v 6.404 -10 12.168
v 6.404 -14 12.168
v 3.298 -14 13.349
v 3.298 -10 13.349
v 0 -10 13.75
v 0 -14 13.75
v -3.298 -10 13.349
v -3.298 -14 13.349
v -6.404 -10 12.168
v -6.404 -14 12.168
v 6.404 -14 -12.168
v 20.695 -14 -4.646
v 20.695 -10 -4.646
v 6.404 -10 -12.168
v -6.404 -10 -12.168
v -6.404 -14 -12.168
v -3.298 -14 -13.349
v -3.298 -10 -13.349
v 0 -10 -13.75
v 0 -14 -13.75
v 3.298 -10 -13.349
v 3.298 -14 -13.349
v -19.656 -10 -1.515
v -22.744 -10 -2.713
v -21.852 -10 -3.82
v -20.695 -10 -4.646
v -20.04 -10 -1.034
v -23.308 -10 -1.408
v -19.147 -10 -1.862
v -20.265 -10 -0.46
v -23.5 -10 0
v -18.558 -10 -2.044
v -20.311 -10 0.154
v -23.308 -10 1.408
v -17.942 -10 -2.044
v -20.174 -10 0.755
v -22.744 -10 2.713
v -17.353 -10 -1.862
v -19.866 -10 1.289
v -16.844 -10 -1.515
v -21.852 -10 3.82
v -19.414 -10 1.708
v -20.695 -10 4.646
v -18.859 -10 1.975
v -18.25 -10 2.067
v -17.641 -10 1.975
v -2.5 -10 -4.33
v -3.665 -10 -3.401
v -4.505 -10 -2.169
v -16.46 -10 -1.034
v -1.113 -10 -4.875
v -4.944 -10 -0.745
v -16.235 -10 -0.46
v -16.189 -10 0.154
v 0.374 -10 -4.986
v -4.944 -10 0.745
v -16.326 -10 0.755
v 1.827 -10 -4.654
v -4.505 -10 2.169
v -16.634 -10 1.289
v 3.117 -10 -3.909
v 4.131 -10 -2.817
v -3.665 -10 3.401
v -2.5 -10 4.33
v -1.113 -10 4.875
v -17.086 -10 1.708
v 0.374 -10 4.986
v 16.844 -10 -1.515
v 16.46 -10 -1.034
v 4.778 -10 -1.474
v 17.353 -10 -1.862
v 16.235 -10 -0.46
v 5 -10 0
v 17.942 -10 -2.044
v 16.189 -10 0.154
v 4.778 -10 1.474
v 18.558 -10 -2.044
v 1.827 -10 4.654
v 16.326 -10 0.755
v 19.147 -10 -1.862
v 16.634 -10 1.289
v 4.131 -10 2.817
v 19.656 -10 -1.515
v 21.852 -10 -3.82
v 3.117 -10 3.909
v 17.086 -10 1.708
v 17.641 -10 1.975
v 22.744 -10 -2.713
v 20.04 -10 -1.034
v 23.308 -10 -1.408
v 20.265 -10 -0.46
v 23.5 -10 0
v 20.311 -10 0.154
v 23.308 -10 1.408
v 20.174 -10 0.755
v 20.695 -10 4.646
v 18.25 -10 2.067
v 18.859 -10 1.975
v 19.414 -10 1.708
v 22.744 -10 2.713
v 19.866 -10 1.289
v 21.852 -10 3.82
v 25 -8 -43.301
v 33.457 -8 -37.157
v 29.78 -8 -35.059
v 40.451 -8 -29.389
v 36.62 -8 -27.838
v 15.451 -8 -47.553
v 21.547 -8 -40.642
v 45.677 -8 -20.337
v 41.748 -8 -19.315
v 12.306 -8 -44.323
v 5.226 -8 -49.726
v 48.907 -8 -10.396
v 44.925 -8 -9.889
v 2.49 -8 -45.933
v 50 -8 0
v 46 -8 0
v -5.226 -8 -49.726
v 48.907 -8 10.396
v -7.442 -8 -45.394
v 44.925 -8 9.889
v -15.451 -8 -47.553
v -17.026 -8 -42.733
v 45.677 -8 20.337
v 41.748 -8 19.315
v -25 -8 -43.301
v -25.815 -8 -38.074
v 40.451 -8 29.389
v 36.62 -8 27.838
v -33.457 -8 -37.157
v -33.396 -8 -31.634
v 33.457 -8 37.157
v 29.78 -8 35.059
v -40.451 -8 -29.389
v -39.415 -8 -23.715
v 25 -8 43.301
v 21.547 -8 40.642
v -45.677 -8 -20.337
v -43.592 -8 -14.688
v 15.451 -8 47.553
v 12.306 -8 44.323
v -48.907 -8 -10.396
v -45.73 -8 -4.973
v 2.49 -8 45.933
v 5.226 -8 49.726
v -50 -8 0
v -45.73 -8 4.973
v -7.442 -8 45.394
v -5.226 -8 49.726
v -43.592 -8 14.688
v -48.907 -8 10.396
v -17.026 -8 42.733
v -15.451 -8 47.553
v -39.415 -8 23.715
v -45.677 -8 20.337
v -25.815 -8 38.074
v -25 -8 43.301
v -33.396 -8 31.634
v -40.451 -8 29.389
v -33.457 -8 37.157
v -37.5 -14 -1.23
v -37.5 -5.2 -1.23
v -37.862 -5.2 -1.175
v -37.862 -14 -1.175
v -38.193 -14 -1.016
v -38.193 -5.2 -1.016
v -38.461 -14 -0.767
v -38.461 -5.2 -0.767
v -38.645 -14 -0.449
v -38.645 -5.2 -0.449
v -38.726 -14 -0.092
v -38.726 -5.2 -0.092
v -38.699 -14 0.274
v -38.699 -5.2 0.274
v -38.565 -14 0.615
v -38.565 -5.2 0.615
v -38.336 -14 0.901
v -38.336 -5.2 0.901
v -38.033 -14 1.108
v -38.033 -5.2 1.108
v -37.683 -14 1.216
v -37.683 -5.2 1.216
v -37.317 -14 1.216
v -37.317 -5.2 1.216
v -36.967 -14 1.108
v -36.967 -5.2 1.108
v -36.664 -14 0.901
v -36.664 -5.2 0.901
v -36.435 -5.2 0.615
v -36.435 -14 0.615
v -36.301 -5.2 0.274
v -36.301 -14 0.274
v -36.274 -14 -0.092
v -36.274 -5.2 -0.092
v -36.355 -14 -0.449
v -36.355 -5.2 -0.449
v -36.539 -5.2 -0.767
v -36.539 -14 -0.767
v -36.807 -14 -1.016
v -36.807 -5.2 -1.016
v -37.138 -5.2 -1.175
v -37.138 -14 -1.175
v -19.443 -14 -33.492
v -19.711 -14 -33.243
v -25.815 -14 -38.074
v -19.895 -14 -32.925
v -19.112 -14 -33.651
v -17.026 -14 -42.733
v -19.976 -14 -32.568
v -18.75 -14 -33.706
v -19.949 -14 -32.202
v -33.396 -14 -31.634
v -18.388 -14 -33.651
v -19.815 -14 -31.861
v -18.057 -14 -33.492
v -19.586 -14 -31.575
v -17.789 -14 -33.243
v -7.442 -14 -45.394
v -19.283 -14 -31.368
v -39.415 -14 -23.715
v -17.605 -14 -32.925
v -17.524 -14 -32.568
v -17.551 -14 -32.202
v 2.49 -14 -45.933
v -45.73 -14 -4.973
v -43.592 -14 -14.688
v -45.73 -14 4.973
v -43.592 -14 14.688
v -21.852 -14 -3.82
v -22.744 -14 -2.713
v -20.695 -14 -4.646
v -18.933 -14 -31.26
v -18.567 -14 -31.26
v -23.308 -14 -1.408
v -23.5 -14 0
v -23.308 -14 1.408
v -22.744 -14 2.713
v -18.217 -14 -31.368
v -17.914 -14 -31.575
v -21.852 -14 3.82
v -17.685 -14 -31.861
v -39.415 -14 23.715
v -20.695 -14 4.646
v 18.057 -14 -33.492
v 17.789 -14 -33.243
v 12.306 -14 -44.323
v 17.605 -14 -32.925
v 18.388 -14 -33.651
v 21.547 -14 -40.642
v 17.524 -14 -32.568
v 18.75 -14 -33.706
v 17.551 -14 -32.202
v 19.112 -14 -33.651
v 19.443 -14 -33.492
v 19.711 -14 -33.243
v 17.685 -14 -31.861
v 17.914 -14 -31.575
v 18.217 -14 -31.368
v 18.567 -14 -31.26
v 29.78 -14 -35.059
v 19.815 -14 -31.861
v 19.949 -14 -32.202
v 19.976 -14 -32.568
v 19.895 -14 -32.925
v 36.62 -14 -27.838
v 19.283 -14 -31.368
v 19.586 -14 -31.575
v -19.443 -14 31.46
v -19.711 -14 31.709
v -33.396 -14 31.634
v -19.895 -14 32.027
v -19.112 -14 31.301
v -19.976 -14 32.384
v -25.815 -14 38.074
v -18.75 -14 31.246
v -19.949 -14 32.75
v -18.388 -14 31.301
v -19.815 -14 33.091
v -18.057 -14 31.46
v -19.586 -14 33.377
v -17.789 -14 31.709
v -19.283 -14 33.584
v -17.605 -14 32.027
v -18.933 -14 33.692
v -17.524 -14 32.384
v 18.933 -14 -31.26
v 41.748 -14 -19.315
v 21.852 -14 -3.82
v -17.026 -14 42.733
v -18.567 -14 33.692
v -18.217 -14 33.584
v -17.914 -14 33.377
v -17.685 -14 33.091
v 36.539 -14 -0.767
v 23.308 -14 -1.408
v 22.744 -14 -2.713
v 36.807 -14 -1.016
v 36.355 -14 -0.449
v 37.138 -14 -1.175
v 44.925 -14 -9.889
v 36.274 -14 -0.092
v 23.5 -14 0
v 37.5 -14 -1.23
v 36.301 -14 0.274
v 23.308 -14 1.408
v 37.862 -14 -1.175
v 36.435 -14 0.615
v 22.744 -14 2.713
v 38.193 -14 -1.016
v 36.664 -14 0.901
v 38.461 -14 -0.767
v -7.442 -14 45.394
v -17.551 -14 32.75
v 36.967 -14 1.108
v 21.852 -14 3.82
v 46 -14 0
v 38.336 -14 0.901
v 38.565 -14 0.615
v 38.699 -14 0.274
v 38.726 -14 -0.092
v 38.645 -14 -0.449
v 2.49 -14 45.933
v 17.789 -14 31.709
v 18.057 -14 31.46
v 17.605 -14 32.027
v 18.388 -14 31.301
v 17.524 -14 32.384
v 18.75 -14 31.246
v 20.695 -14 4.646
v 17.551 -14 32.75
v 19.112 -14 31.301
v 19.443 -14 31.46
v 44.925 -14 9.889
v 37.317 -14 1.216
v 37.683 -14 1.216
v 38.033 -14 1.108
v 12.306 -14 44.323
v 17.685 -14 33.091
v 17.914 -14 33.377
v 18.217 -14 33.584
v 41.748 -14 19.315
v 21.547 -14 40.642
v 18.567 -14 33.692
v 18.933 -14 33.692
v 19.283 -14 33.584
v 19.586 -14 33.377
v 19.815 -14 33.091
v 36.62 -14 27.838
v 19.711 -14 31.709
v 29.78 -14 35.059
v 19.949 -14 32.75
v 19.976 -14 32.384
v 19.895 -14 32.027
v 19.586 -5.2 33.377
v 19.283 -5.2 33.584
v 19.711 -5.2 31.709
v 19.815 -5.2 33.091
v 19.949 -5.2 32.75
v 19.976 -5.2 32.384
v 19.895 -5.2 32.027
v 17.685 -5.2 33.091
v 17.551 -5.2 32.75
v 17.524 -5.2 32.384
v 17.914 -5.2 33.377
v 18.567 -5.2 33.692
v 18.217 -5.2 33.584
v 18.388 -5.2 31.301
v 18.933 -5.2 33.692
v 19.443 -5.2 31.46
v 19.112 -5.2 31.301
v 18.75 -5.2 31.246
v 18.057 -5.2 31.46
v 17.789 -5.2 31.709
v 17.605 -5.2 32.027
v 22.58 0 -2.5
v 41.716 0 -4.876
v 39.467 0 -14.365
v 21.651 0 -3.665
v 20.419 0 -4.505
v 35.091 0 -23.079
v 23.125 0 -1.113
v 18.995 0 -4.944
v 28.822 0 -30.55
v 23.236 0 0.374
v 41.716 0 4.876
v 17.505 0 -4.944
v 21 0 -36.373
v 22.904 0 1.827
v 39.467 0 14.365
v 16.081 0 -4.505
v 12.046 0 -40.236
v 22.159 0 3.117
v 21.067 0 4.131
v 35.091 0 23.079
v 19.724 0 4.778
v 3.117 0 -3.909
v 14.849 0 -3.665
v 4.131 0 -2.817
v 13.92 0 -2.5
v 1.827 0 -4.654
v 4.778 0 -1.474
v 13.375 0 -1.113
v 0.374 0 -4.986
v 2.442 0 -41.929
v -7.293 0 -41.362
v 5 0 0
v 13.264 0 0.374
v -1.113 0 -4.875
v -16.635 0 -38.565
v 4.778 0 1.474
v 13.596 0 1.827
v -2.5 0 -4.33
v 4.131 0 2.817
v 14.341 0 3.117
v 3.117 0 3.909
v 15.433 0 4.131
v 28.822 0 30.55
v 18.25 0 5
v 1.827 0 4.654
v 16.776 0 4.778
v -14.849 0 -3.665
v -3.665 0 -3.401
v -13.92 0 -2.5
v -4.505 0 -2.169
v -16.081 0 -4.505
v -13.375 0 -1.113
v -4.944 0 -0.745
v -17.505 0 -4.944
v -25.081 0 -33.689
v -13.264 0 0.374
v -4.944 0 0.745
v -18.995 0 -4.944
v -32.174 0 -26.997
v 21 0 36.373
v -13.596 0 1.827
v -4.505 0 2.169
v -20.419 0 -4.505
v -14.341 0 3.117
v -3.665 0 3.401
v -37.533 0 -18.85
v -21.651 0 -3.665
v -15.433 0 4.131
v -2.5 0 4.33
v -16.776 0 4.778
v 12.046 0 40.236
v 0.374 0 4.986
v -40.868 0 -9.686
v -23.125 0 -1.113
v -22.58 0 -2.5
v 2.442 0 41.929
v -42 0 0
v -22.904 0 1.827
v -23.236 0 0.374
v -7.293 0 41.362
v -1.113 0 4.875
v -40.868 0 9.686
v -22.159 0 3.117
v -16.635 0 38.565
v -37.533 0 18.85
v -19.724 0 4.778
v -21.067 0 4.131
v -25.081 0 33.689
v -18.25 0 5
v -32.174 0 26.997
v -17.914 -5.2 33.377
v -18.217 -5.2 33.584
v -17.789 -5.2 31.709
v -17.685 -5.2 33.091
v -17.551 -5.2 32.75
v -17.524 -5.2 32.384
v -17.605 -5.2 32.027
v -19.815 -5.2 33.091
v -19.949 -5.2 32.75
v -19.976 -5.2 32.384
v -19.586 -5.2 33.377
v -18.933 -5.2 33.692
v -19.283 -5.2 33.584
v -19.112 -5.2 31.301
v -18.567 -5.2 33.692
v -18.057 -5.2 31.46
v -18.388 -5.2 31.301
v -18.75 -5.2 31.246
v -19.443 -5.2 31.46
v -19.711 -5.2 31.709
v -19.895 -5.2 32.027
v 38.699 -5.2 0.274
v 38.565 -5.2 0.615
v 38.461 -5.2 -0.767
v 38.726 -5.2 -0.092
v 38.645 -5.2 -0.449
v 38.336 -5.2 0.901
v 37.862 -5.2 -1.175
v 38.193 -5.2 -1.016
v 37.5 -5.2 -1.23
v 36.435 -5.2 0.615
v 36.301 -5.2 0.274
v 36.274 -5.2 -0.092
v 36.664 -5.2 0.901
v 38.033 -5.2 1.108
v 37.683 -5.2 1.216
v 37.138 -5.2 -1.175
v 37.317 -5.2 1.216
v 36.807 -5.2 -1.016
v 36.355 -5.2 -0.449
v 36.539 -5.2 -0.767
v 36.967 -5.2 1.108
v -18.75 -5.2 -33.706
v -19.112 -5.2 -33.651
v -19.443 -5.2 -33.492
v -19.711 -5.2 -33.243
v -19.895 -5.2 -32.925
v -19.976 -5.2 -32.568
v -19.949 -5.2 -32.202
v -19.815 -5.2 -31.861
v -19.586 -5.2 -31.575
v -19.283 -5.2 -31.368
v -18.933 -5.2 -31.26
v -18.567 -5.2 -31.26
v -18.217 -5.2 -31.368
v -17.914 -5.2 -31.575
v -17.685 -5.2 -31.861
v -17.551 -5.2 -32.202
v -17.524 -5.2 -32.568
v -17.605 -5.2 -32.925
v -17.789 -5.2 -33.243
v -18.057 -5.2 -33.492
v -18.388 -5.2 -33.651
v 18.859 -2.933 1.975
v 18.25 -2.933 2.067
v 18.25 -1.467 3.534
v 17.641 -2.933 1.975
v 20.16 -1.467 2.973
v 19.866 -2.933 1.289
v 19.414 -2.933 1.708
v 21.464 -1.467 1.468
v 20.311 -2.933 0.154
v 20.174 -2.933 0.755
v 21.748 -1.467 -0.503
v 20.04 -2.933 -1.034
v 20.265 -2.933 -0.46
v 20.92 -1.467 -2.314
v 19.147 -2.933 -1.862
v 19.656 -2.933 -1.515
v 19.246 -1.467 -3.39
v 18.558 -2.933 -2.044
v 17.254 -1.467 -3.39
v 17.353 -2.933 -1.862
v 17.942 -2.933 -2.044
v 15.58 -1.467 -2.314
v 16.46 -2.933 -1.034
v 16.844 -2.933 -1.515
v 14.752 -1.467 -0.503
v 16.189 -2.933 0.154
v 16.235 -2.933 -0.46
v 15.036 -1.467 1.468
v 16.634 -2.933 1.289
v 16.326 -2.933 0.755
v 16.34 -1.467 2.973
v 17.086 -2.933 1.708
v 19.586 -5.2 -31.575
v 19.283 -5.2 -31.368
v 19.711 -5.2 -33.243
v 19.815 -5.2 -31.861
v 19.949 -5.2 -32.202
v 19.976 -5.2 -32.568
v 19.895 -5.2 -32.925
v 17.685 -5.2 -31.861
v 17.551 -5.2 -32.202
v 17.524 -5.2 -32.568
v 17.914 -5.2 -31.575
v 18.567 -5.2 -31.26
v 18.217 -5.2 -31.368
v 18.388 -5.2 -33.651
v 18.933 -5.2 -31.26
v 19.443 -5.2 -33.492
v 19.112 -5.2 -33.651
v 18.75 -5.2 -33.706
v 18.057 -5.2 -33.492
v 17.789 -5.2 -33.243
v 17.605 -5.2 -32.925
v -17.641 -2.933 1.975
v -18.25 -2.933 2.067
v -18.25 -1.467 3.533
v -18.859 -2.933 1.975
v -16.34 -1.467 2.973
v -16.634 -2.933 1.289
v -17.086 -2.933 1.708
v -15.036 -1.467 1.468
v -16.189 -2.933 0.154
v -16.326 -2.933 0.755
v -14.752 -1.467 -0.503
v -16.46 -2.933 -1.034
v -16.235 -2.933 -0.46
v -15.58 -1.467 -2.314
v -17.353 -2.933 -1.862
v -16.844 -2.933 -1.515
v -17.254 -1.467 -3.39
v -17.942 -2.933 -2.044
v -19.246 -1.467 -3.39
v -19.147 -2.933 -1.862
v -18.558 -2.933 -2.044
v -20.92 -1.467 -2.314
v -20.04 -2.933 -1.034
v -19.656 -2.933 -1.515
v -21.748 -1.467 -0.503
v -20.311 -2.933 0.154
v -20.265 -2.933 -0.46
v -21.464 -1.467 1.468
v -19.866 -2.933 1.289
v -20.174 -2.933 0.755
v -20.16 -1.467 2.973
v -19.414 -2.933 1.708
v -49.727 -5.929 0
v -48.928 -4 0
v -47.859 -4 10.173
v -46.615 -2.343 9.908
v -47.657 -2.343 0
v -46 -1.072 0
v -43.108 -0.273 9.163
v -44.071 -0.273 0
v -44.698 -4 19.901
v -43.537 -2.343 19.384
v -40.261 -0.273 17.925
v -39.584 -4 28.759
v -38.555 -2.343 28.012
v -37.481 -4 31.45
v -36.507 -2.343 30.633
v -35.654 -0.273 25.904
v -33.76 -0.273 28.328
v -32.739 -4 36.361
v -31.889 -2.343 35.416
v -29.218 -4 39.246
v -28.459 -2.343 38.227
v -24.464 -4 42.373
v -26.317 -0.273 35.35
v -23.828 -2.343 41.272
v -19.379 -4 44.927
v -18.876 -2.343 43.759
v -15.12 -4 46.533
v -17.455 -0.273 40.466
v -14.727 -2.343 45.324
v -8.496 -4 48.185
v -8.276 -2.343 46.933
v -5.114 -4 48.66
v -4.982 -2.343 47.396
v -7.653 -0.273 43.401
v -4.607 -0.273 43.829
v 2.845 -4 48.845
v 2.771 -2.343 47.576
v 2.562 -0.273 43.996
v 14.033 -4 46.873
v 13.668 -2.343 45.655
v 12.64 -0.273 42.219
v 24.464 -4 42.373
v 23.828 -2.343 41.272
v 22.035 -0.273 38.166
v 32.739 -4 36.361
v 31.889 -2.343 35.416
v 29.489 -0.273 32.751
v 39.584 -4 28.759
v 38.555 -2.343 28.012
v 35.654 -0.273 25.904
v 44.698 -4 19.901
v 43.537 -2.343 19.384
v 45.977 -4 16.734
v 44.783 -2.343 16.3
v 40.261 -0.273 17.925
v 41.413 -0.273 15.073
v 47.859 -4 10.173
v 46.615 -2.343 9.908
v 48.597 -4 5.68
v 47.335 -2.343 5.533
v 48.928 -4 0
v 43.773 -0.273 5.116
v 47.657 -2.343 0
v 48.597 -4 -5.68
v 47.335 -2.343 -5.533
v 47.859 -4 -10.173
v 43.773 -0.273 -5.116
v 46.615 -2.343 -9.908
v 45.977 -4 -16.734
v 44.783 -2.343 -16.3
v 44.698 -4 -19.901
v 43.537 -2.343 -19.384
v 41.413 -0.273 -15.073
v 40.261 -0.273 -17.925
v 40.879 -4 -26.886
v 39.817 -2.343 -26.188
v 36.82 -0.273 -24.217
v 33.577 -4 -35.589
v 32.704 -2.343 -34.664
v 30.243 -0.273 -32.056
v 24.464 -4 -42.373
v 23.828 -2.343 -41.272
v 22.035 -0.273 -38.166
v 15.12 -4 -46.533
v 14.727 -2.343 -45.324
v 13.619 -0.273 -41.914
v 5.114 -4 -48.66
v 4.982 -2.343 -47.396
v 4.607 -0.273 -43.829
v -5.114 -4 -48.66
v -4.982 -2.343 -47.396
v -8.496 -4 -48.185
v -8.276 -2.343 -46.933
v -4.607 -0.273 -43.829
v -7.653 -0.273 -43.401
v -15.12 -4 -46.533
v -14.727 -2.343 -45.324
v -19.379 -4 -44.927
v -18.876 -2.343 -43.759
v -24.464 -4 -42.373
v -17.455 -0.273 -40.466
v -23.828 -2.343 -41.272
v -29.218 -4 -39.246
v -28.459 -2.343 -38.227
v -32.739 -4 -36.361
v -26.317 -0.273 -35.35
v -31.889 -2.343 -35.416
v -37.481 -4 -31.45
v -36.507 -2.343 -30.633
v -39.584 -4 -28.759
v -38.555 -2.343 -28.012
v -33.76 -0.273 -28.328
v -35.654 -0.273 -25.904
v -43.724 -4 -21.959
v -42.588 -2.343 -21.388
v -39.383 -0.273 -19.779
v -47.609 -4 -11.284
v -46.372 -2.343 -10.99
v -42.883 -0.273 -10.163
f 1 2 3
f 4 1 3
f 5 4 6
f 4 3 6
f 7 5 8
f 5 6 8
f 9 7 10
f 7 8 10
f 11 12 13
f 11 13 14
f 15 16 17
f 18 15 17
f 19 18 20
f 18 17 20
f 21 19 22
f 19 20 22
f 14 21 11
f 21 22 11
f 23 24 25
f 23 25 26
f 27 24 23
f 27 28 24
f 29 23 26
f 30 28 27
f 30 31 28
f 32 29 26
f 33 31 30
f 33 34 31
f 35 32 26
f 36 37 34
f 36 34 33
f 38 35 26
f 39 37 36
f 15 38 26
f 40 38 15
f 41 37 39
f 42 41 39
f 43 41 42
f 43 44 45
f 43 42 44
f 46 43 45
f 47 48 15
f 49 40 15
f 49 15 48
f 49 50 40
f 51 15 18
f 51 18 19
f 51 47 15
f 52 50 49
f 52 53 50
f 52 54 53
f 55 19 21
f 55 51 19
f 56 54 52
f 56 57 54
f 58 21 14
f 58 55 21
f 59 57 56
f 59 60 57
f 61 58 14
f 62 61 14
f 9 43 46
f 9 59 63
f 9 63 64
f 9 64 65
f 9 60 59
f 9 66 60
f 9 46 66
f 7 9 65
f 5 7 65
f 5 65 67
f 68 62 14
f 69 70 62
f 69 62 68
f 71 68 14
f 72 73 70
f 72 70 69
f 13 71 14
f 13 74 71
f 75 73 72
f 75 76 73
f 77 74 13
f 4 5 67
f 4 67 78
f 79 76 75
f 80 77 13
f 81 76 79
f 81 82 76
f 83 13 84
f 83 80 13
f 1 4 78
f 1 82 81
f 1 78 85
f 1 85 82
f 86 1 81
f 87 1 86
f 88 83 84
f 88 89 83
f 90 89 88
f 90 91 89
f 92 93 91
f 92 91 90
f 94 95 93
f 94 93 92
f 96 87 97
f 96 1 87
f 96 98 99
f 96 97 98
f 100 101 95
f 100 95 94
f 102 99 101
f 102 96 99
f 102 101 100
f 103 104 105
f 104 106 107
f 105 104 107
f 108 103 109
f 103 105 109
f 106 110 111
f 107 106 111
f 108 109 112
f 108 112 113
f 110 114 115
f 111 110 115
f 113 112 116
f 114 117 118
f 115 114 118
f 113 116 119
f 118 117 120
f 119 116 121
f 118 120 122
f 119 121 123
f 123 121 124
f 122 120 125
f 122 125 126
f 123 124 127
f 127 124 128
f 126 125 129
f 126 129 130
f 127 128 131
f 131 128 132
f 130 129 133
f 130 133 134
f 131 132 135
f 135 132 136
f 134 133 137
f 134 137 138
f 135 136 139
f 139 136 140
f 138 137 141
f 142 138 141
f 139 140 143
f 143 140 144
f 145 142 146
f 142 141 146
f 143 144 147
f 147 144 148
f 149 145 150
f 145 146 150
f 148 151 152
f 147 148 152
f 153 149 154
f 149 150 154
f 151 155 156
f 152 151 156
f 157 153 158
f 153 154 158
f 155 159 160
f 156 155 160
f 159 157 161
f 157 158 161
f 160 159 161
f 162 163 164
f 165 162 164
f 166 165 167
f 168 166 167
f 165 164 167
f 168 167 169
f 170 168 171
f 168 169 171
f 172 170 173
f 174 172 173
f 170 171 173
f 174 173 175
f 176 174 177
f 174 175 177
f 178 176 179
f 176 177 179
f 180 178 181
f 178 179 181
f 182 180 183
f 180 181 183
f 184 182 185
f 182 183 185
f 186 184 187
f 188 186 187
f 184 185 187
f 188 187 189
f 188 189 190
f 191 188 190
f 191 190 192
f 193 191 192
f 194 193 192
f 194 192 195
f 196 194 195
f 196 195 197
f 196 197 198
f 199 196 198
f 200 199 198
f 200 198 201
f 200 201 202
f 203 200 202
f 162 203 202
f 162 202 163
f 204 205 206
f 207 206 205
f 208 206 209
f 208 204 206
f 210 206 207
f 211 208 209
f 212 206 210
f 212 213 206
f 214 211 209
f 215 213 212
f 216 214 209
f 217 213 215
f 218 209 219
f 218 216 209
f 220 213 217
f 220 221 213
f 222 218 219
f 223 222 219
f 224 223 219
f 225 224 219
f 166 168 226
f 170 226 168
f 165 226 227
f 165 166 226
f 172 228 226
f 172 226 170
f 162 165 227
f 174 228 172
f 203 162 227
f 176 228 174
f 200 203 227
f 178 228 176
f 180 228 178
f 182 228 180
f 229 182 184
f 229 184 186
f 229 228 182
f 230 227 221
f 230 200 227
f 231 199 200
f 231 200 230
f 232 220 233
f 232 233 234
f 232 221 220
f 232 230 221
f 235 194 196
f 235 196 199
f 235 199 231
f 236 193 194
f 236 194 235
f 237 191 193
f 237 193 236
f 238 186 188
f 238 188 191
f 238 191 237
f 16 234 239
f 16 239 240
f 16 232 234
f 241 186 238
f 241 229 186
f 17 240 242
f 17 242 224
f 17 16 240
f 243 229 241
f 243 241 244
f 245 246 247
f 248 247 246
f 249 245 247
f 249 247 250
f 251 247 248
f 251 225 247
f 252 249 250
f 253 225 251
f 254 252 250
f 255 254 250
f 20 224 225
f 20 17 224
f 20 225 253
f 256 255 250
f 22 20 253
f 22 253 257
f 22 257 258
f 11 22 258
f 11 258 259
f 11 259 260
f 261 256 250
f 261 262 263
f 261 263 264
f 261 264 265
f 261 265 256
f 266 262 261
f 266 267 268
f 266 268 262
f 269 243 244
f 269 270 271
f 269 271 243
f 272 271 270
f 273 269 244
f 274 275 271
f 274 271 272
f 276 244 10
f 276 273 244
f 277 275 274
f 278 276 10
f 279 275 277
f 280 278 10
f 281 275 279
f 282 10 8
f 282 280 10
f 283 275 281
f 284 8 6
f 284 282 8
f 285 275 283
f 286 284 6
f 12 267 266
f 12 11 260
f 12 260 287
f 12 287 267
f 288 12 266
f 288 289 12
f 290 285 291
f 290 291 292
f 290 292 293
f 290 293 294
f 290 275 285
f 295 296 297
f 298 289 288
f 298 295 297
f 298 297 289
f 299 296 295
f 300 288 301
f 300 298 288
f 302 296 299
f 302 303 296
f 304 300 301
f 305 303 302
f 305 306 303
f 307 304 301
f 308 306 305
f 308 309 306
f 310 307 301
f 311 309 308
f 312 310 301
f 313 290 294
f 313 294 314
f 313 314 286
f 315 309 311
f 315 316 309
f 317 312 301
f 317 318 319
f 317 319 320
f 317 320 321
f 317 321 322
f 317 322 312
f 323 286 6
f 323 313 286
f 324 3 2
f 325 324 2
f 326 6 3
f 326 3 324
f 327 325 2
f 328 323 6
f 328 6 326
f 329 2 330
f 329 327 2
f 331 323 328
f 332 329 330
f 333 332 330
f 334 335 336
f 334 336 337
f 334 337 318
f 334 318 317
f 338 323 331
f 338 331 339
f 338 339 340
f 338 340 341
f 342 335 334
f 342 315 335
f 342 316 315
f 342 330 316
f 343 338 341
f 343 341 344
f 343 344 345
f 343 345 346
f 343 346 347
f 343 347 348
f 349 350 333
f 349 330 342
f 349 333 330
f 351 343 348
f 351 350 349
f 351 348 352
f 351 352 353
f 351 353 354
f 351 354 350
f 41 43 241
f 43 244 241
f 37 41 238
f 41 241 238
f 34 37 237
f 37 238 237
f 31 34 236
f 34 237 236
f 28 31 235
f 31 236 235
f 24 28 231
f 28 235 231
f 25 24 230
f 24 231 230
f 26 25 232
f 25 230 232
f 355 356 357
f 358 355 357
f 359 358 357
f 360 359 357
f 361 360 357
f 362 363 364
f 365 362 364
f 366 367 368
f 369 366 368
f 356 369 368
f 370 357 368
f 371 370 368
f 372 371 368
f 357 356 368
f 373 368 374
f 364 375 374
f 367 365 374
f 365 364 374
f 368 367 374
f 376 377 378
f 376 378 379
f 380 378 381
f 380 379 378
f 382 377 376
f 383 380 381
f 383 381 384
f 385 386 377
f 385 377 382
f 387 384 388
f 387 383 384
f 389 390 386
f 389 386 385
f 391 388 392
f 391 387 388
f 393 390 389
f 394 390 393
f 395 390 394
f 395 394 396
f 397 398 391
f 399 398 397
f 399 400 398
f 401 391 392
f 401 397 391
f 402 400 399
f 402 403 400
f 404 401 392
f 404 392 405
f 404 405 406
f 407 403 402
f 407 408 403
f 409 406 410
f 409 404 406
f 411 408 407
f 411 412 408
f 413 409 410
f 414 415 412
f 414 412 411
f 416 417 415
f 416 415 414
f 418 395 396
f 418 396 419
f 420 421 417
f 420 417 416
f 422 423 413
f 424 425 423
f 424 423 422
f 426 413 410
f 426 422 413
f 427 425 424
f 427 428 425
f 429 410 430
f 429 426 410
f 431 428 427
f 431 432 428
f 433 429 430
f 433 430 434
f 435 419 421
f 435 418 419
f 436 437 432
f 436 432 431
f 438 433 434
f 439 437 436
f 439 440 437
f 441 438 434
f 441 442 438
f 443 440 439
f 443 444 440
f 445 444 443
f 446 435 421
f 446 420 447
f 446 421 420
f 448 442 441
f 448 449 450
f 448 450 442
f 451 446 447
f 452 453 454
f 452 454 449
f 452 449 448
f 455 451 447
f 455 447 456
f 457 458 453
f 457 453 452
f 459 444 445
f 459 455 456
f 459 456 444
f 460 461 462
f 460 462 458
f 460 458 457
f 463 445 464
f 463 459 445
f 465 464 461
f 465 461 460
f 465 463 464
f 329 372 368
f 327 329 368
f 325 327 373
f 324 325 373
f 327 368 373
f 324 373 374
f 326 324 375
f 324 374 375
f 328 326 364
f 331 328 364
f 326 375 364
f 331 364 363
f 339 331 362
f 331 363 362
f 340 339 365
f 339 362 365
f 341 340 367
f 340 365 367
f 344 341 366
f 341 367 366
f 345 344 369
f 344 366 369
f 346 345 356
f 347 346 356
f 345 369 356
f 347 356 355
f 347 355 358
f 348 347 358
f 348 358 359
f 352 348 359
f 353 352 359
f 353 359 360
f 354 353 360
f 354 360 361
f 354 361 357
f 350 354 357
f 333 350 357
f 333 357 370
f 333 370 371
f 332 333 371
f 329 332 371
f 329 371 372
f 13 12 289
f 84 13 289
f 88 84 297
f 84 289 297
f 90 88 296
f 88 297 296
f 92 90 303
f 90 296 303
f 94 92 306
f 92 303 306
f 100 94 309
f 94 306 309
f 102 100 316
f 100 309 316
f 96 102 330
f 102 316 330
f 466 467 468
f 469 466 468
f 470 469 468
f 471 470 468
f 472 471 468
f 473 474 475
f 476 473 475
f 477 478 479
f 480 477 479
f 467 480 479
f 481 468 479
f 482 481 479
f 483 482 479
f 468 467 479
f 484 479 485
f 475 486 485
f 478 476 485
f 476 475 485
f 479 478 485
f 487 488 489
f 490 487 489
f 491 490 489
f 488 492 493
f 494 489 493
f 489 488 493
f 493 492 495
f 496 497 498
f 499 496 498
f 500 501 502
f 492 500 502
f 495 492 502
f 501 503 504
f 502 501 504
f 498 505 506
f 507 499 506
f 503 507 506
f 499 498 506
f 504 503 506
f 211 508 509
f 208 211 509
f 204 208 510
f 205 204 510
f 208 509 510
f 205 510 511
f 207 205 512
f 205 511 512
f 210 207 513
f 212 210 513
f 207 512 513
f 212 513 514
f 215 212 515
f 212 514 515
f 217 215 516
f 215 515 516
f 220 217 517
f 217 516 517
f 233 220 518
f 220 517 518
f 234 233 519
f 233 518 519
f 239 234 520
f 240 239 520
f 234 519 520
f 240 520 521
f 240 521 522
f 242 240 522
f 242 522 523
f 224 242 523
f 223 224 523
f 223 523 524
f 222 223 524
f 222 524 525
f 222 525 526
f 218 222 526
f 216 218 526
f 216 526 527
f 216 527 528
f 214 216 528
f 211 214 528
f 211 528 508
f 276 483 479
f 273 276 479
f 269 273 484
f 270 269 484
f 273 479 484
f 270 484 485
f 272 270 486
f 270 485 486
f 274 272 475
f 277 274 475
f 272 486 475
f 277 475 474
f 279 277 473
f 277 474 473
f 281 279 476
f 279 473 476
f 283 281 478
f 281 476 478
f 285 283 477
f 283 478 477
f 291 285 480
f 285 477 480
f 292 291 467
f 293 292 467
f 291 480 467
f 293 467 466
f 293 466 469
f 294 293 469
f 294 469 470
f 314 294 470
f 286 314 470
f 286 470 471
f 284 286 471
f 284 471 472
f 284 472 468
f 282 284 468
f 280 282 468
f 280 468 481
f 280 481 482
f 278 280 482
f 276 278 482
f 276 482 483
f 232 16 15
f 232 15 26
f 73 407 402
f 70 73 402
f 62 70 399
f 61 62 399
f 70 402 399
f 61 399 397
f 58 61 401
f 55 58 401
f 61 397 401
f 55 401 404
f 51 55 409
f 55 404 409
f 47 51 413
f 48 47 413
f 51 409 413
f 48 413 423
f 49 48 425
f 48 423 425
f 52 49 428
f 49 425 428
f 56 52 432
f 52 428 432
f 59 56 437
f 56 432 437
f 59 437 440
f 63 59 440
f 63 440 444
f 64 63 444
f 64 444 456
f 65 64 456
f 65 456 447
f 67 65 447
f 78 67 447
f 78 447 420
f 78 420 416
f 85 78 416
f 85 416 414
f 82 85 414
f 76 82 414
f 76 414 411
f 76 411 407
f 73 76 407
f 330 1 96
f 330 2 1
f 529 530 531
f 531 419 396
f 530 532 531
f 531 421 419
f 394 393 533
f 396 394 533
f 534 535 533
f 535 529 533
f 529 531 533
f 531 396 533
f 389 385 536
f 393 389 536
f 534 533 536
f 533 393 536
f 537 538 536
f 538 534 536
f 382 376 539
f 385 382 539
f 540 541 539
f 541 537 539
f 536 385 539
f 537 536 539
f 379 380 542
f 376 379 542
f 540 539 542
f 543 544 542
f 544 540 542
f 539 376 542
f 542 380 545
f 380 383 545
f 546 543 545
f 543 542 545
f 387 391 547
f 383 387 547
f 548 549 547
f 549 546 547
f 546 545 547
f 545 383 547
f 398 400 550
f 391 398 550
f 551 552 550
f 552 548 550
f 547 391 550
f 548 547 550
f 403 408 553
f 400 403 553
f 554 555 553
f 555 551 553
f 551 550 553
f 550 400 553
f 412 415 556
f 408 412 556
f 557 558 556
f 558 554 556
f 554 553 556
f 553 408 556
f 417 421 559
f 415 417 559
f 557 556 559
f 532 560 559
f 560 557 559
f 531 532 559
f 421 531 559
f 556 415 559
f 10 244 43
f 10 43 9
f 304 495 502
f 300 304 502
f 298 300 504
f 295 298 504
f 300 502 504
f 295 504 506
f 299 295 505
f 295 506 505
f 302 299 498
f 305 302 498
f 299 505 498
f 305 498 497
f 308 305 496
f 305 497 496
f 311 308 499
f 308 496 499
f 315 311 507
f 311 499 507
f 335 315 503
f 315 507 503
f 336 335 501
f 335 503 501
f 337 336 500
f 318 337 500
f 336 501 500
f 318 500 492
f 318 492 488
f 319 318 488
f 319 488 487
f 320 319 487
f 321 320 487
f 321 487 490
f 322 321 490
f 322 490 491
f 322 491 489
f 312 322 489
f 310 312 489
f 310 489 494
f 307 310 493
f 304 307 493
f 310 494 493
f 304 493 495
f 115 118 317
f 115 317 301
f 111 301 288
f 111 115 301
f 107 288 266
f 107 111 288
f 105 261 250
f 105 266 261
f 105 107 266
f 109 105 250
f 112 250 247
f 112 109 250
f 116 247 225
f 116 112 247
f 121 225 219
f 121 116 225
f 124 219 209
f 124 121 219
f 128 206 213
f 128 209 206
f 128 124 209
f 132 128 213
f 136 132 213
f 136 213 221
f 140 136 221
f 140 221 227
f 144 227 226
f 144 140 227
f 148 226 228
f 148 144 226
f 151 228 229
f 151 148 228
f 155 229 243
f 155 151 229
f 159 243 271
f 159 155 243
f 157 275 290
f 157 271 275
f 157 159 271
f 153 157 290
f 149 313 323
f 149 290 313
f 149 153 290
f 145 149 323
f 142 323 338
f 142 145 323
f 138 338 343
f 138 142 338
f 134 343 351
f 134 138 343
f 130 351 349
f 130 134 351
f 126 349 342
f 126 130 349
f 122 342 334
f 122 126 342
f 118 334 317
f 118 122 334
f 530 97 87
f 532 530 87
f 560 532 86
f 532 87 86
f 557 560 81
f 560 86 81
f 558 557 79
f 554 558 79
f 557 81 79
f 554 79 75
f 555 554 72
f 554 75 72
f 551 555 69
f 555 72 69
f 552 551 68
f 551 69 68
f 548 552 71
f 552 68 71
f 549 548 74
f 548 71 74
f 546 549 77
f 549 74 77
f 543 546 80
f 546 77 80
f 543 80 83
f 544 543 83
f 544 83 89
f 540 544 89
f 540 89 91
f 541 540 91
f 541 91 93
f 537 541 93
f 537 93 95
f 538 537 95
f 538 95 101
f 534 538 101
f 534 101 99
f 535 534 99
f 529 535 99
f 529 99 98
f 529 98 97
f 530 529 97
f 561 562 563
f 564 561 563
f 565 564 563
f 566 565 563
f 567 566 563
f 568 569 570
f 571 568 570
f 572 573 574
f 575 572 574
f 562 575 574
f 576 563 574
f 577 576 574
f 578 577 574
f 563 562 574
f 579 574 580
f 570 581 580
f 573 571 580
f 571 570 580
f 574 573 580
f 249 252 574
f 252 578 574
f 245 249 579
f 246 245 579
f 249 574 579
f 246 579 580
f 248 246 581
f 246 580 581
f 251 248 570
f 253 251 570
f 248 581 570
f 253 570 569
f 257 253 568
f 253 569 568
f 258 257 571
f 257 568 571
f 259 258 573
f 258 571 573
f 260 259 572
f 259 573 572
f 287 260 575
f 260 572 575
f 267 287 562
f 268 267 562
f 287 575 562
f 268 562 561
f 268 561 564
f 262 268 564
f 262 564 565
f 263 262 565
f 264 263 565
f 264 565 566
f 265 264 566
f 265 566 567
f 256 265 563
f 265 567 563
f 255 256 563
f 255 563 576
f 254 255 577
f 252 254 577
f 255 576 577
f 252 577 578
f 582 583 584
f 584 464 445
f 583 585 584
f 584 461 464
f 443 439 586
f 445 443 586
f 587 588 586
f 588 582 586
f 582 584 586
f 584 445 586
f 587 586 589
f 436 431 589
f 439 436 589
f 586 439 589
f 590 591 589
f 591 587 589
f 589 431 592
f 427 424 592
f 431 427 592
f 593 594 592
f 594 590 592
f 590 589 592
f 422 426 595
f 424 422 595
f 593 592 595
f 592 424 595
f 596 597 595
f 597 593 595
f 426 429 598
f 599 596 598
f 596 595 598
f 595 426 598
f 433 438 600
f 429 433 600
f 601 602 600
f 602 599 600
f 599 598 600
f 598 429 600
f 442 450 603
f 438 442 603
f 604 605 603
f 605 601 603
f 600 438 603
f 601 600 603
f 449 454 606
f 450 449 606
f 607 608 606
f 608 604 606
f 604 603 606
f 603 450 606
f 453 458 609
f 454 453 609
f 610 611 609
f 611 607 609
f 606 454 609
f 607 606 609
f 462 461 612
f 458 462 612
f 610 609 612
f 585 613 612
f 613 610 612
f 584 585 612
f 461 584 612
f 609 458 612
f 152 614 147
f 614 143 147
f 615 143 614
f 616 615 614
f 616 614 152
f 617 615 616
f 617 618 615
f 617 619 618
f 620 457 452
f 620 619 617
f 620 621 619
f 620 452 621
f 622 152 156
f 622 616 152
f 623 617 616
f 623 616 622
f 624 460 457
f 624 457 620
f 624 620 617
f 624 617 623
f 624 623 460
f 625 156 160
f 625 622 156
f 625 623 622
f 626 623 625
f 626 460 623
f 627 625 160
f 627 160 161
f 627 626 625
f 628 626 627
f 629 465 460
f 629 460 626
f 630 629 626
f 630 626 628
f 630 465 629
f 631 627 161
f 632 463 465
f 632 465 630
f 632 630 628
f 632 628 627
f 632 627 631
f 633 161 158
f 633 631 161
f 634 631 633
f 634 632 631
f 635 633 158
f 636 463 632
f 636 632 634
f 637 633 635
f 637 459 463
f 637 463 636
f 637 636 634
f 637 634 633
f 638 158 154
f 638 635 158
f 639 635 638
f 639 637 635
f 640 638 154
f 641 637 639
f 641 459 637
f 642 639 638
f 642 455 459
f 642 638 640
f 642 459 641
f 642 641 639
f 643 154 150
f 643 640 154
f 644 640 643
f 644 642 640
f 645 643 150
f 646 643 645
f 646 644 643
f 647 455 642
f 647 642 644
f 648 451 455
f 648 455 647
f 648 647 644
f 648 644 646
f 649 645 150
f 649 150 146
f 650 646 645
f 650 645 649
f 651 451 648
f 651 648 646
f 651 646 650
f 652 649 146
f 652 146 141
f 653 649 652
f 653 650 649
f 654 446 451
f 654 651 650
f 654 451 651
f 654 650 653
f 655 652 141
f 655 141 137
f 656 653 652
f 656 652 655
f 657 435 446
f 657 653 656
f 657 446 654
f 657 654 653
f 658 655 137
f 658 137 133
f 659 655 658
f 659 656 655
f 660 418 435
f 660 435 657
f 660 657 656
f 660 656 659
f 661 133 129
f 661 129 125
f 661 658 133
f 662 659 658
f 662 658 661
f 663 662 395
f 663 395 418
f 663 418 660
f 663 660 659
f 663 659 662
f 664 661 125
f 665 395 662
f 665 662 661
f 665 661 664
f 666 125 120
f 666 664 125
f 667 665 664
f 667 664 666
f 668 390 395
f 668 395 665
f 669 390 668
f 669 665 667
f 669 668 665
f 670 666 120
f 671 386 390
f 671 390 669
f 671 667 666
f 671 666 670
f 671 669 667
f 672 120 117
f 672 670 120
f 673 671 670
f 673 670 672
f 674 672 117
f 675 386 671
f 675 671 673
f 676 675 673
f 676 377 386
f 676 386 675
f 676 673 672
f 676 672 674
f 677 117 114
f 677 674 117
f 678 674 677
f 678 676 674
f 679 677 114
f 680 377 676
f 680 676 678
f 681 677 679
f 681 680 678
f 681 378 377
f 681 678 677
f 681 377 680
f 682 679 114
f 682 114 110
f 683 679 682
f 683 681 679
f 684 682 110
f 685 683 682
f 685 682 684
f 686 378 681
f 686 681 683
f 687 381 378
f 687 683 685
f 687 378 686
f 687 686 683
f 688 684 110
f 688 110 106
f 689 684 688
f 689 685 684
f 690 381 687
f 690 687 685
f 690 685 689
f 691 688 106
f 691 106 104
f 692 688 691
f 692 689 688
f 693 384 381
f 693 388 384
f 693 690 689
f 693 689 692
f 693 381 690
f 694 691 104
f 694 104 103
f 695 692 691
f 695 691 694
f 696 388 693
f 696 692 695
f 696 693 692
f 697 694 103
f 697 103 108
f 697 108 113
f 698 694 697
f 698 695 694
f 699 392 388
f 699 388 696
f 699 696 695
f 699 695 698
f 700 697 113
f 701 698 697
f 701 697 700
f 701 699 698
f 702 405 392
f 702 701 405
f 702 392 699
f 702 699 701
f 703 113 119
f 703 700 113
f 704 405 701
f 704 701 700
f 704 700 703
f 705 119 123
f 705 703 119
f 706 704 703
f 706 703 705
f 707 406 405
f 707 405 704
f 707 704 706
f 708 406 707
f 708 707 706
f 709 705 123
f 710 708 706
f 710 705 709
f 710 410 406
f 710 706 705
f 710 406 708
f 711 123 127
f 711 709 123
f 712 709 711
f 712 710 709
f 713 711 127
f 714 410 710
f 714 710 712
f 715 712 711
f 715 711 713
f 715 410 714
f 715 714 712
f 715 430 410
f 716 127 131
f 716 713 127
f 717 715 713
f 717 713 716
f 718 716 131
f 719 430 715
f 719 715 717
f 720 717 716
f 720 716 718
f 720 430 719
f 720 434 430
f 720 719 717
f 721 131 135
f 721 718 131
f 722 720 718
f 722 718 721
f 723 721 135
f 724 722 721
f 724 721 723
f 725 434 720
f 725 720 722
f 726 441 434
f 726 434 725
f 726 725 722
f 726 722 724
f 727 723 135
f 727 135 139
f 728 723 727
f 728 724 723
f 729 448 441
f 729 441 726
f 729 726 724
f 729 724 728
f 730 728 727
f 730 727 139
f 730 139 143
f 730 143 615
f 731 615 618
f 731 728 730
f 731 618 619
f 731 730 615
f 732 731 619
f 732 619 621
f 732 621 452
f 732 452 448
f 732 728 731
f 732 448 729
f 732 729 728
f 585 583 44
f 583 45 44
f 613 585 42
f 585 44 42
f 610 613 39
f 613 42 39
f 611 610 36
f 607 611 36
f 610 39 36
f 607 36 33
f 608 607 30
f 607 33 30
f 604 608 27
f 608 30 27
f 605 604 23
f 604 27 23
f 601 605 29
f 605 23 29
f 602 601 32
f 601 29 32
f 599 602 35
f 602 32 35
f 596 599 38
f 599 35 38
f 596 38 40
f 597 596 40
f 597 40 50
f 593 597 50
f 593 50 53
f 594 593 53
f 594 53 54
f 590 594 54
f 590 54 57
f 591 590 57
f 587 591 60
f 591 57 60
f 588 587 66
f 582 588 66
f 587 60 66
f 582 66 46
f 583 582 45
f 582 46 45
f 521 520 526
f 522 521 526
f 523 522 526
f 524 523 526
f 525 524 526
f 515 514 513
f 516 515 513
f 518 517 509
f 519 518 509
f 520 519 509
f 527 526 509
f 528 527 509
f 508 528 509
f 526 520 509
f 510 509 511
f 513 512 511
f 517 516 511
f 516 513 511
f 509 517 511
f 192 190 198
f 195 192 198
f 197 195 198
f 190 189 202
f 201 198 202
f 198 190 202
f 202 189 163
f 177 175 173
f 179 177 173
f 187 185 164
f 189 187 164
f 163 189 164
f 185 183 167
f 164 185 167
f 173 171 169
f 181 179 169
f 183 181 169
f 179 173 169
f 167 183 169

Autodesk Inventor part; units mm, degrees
ref_plane "YZ Plane" through (0, 0, 0) normal (1, 0, 0) x (0, 1, 0)
ref_plane "XZ Plane" through (0, 0, 0) normal (0, 1, 0) x (-1, 0, 0)
ref_plane "XY Plane" through (0, 0, 0) normal (0, 0, 1) x (1, 0, 0)
sketch "Boceto1" plane through (0, 0, 0) normal (0, 1, 0) x (-1, 0, 0)
  circle A0 centre (0, 0) radius 50
  dimension "Diametro" = 100
extrude "Extrusión1" add sketch "Boceto1" against normal blind 8
fillet "Empalme1" radius 8 1 edges at (50, 0, 0)
sketch "Boceto2" plane through (0, -8, 0) normal (0, -1, 0) x (1, 0, 0)
  circle A0 centre (0, 0) radius 46
  circle A1 centre (0, 0) radius 50 projected
  dimension "d22" = 4
extrude "Extrusión3" add sketch "Boceto2" along normal blind 6 contours A0
sketch "Boceto3" plane through (0, -14, 0) normal (0, -1, 0) x (1, 0, 0)
  point P0 (0, 0)
  point P1 (-37.5, 0)
  point P2 (-18.75, -32.476)
  point P3 (18.75, -32.476)
  point P4 (37.5, 0)
  point P5 (18.75, 32.476)
  point P6 (-18.75, 32.476)
  dimension "d25" = 37.5
  dimension "d35" = 360
hole "Agujero2" at (-37.5, -14, 0) at (-18.75, -14, 32.476) at (-18.75, -14, -32.476) at (18.75, -14, 32.476) at (37.5, -14, 0) at (18.75, -14, -32.476) direction (0, 1, 0) diameter 2.459 depth 8.8 thread size "M3x0.5" class "6H" standard "ANSI Metric M Profile"
sketch "Boceto4" plane through (0, -14, 0) normal (0, -1, 0) x (1, 0, 0)
  arc A0 (20.5788, -4.4246) -> (20.5788, 4.4246) centre (18.25, 0) ccw
  line L0 (20.5788, 4.4246) -> (6.2877, 11.9463)
  arc A1 (6.2877, 11.9463) -> (-6.2877, 11.9463) centre (0, 0) ccw
  line L1 (-6.2877, 11.9463) -> (-20.5788, 4.4246)
  arc A2 (-20.5788, 4.4246) -> (-20.5788, -4.4246) centre (-18.25, 0) ccw
  line L2 (-20.5788, -4.4246) -> (-6.2877, -11.9463)
  arc A3 (-6.2877, -11.9463) -> (6.2877, -11.9463) centre (0, 0) ccw
  line L3 (6.2877, -11.9463) -> (20.5788, -4.4246)
  line L4 (-17.0094, 4.3256) -> (-5.4726, 10.3977)
  arc A4 (5.4726, 10.3977) -> (-5.4726, 10.3977) centre (0, 0) ccw
  line L5 (5.4726, 10.3977) -> (17.0094, 4.3256)
  arc A5 (17.0094, 4.3256) -> (17.0094, -4.3256) centre (18.25, 0) ccw
  line L6 (17.0094, -4.3256) -> (5.4726, -10.3977)
  arc A6 (-5.4726, -10.3977) -> (5.4726, -10.3977) centre (0, 0) ccw
  line L7 (-5.4726, -10.3977) -> (-17.0094, -4.3256)
  arc A7 (-17.0094, -4.3256) -> (-17.0094, 4.3256) centre (-18.25, 0) ccw
  circle A8 centre (18.25, 0) radius 2.5
  circle A9 centre (-18.25, 0) radius 2.5
  point P0 (0, 0)
  point P1 (20.5788, 4.4246)
  point P2 (-6.2877, 11.9463)
  point P3 (-20.5788, -4.4246)
  point P4 (6.2877, -11.9463)
  dimension "d3" = 8
extrude "Extrusión5" cut sketch "Boceto4" against normal blind 4 contours L3 A3 L2 A2 L1 A1 L0 A0 | L4 A4 L5 A5 L6 A6 L7 A7 | A8 | A9
sketch "Boceto5" plane through (0, -14, 0) normal (0, -1, 0) x (1, 0, 0)
  line L0 (6.2877, 11.9463) -> (20.5788, 4.4246) projected
  arc A0 (6.2877, 11.9463) -> (-6.2877, 11.9463) centre (0, 0) ccw projected
  line L1 (-20.5788, 4.4246) -> (-6.2877, 11.9463) projected
  arc A1 (-20.5788, 4.4246) -> (-20.5788, -4.4246) centre (-18.25, 0) ccw projected
  line L2 (-6.2877, -11.9463) -> (-20.5788, -4.4246) projected
  arc A2 (-6.2877, -11.9463) -> (6.2877, -11.9463) centre (0, 0) ccw projected
  line L3 (20.5788, -4.4246) -> (6.2877, -11.9463) projected
  arc A3 (20.5788, -4.4246) -> (20.5788, 4.4246) centre (18.25, 0) ccw projected
  arc A4 (6.4041, 12.1676) -> (-6.4041, 12.1676) centre (0, 0) ccw
  line L4 (6.4041, 12.1676) -> (20.6952, 4.6458)
  arc A5 (20.6952, -4.6458) -> (20.6952, 4.6458) centre (18.25, 0) ccw
  line L5 (20.6952, -4.6458) -> (6.4041, -12.1676)
  arc A6 (-6.4041, -12.1676) -> (6.4041, -12.1676) centre (0, 0) ccw
  line L6 (-6.4041, -12.1676) -> (-20.6952, -4.6458)
  arc A7 (-20.6952, 4.6458) -> (-20.6952, -4.6458) centre (-18.25, 0) ccw
  line L7 (-20.6952, 4.6458) -> (-6.4041, 12.1676)
  point P0 (0, 0)
  dimension "d44" = 0.25
extrude "Extrusión7" cut sketch "Boceto5" against normal up to surface (4 mm away) contours L0 A3 L3 A2 L2 A1 L1 A0 | L4 A5 L5 A6 L6 A7 L7 A4
sketch "Boceto6" plane through (0, 0, 0) normal (0, 1, 0) x (1, 0, 0)
  point P0 (0, 0)
  point P1 (-18.25, 0)
  point P2 (18.25, 0)
hole "Agujero3" at (-18.25, 0, 0) at (18.25, 0, 0) direction (0, -1, 0) diameter 4.134 end through all countersink diameter 10 countersink angle 90 thread size "M5x0.8" class "6H" standard "ISO Metric profile"
sketch "Boceto7" plane through (0, 0, 0) normal (0, 1, 0) x (1, 0, 0)
  circle A0 centre (0, 0) radius 5
  dimension "d54" = 10
extrude "Extrusión8" cut sketch "Boceto7" against normal through all
sketch "Boceto9" plane through (0, 0, 0) normal (0, 1, 0) x (1, 0, 0)
  circle A0 centre (0, 0) radius 8.0135
  circle A1 centre (0, 0) radius 5
  dimension "d57" = 16.027
  dimension "d58" = 10
extrude "Extrusión9" [suppressed]
extrude "Extrusión10" [suppressed]
properties part number "Tapa" material "Aluminum 7075"
